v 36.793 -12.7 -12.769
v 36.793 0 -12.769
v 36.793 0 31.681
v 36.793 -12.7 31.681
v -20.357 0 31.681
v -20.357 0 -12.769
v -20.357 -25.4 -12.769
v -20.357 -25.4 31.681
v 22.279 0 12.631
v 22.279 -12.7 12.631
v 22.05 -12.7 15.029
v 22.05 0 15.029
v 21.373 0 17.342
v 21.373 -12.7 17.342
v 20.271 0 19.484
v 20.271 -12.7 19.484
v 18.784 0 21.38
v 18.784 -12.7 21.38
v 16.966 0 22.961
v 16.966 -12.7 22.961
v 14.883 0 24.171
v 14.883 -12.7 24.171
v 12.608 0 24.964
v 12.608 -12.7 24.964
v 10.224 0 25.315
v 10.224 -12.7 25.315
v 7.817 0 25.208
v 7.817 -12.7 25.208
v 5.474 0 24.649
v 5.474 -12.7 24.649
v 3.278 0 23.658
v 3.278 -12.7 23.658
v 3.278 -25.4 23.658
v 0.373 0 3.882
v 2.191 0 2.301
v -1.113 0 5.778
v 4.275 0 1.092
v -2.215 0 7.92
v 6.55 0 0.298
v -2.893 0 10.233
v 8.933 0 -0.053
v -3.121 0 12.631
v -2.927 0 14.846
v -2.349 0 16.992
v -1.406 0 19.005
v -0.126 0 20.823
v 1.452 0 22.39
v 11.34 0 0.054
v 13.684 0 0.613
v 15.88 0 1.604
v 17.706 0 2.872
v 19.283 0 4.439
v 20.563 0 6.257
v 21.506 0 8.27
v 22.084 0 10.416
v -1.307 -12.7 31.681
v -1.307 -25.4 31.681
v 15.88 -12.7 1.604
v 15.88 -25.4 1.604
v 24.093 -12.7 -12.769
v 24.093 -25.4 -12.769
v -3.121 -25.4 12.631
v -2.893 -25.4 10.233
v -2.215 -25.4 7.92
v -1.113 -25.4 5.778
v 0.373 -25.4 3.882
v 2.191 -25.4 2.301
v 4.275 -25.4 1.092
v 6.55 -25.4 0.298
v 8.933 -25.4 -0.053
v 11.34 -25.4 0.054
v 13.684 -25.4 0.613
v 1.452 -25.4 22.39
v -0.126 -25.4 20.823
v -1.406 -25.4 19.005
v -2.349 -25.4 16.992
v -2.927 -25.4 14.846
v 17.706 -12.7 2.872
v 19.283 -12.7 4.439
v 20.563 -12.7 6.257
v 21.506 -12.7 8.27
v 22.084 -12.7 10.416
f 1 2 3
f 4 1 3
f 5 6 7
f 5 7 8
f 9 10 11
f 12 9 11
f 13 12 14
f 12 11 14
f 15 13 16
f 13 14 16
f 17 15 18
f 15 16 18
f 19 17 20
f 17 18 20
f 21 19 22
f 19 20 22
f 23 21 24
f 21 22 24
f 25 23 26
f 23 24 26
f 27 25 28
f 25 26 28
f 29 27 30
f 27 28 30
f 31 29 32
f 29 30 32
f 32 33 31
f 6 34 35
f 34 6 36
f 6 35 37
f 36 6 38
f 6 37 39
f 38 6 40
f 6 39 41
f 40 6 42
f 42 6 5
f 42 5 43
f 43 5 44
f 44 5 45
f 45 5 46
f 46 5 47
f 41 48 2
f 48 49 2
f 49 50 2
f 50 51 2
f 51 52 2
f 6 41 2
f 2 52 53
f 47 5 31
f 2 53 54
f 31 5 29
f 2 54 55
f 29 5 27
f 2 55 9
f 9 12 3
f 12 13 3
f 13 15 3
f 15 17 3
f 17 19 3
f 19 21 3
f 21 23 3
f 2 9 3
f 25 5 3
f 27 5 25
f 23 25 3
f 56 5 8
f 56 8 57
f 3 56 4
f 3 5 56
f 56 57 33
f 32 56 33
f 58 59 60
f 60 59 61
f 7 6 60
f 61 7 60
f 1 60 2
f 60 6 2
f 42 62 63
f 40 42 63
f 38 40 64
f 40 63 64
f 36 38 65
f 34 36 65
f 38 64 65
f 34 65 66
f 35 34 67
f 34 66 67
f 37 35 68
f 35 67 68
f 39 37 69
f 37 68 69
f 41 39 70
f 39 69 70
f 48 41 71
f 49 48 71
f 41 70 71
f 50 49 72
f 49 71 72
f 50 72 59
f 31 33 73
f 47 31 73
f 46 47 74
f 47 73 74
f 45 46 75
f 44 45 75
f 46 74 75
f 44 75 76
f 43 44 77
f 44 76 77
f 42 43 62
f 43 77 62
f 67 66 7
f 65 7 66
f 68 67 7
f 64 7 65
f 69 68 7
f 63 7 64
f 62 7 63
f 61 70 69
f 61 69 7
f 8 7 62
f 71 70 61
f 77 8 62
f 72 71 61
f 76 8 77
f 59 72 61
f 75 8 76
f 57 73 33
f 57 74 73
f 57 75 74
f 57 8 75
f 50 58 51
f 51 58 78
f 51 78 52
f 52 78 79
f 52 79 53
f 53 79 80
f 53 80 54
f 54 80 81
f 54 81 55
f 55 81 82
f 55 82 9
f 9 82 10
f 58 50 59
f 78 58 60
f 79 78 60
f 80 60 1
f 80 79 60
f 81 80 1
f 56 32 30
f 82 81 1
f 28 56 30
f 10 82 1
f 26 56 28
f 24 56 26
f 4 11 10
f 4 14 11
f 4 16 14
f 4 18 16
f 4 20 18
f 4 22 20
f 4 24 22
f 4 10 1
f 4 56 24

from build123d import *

# Parameters (mm, degrees)
F0_W     = 57.15
F0_H     = 44.45
F1_DEPTH = 25.4
F3_DEPTH = 12.7
F5_DEPTH = 25.4


with BuildPart() as f1:
    # F0 (on Front) → F1 (new body)
    with BuildSketch(Plane.XZ):
        with Locations((8.218082, 9.456021)):
            Rectangle(F0_W, F0_H)
    extrude(amount=F1_DEPTH)

    # F2 (on face) → F3 (cut)
    with BuildSketch(Plane.XZ.offset(25.4)):
        Polygon((36.793082, 31.681021), (-1.306918, 31.681021), (24.093082, -12.768979), (36.793082, -12.768979), align=None)
    extrude(amount=-F3_DEPTH, mode=Mode.SUBTRACT)

    # F4 (on face) → F5 (cut)
    with BuildSketch(Plane.XZ.offset(25.4)):
        with BuildLine():
            Line((3.277831, 23.657709), (9.578796, 12.631021))
            Line((9.578796, 12.631021), (22.278796, 12.631021))
            ThreePointArc((22.278796, 12.631021), (15.953267, 23.61538), (3.277831, 23.657709))
        make_face()
        with BuildLine():
            Line((9.578796, 12.631021), (-3.121204, 12.631021))
            ThreePointArc((-3.121204, 12.631021), (3.204325, 1.646663), (15.87976, 1.604333))
            Line((15.87976, 1.604333), (9.578796, 12.631021))
        make_face()
        with BuildLine():
            Line((9.578796, 12.631021), (15.87976, 1.604333))
            ThreePointArc((15.87976, 1.604333), (20.563154, 6.256551), (22.278796, 12.631021))
            Line((22.278796, 12.631021), (9.578796, 12.631021))
        make_face()
        with BuildLine():
            ThreePointArc((3.277831, 23.657709), (-1.405562, 19.005492), (-3.121204, 12.631021))
            Line((-3.121204, 12.631021), (9.578796, 12.631021))
            Line((9.578796, 12.631021), (3.277831, 23.657709))
        make_face()
    extrude(amount=-F5_DEPTH, mode=Mode.SUBTRACT)


solid = f1.part
